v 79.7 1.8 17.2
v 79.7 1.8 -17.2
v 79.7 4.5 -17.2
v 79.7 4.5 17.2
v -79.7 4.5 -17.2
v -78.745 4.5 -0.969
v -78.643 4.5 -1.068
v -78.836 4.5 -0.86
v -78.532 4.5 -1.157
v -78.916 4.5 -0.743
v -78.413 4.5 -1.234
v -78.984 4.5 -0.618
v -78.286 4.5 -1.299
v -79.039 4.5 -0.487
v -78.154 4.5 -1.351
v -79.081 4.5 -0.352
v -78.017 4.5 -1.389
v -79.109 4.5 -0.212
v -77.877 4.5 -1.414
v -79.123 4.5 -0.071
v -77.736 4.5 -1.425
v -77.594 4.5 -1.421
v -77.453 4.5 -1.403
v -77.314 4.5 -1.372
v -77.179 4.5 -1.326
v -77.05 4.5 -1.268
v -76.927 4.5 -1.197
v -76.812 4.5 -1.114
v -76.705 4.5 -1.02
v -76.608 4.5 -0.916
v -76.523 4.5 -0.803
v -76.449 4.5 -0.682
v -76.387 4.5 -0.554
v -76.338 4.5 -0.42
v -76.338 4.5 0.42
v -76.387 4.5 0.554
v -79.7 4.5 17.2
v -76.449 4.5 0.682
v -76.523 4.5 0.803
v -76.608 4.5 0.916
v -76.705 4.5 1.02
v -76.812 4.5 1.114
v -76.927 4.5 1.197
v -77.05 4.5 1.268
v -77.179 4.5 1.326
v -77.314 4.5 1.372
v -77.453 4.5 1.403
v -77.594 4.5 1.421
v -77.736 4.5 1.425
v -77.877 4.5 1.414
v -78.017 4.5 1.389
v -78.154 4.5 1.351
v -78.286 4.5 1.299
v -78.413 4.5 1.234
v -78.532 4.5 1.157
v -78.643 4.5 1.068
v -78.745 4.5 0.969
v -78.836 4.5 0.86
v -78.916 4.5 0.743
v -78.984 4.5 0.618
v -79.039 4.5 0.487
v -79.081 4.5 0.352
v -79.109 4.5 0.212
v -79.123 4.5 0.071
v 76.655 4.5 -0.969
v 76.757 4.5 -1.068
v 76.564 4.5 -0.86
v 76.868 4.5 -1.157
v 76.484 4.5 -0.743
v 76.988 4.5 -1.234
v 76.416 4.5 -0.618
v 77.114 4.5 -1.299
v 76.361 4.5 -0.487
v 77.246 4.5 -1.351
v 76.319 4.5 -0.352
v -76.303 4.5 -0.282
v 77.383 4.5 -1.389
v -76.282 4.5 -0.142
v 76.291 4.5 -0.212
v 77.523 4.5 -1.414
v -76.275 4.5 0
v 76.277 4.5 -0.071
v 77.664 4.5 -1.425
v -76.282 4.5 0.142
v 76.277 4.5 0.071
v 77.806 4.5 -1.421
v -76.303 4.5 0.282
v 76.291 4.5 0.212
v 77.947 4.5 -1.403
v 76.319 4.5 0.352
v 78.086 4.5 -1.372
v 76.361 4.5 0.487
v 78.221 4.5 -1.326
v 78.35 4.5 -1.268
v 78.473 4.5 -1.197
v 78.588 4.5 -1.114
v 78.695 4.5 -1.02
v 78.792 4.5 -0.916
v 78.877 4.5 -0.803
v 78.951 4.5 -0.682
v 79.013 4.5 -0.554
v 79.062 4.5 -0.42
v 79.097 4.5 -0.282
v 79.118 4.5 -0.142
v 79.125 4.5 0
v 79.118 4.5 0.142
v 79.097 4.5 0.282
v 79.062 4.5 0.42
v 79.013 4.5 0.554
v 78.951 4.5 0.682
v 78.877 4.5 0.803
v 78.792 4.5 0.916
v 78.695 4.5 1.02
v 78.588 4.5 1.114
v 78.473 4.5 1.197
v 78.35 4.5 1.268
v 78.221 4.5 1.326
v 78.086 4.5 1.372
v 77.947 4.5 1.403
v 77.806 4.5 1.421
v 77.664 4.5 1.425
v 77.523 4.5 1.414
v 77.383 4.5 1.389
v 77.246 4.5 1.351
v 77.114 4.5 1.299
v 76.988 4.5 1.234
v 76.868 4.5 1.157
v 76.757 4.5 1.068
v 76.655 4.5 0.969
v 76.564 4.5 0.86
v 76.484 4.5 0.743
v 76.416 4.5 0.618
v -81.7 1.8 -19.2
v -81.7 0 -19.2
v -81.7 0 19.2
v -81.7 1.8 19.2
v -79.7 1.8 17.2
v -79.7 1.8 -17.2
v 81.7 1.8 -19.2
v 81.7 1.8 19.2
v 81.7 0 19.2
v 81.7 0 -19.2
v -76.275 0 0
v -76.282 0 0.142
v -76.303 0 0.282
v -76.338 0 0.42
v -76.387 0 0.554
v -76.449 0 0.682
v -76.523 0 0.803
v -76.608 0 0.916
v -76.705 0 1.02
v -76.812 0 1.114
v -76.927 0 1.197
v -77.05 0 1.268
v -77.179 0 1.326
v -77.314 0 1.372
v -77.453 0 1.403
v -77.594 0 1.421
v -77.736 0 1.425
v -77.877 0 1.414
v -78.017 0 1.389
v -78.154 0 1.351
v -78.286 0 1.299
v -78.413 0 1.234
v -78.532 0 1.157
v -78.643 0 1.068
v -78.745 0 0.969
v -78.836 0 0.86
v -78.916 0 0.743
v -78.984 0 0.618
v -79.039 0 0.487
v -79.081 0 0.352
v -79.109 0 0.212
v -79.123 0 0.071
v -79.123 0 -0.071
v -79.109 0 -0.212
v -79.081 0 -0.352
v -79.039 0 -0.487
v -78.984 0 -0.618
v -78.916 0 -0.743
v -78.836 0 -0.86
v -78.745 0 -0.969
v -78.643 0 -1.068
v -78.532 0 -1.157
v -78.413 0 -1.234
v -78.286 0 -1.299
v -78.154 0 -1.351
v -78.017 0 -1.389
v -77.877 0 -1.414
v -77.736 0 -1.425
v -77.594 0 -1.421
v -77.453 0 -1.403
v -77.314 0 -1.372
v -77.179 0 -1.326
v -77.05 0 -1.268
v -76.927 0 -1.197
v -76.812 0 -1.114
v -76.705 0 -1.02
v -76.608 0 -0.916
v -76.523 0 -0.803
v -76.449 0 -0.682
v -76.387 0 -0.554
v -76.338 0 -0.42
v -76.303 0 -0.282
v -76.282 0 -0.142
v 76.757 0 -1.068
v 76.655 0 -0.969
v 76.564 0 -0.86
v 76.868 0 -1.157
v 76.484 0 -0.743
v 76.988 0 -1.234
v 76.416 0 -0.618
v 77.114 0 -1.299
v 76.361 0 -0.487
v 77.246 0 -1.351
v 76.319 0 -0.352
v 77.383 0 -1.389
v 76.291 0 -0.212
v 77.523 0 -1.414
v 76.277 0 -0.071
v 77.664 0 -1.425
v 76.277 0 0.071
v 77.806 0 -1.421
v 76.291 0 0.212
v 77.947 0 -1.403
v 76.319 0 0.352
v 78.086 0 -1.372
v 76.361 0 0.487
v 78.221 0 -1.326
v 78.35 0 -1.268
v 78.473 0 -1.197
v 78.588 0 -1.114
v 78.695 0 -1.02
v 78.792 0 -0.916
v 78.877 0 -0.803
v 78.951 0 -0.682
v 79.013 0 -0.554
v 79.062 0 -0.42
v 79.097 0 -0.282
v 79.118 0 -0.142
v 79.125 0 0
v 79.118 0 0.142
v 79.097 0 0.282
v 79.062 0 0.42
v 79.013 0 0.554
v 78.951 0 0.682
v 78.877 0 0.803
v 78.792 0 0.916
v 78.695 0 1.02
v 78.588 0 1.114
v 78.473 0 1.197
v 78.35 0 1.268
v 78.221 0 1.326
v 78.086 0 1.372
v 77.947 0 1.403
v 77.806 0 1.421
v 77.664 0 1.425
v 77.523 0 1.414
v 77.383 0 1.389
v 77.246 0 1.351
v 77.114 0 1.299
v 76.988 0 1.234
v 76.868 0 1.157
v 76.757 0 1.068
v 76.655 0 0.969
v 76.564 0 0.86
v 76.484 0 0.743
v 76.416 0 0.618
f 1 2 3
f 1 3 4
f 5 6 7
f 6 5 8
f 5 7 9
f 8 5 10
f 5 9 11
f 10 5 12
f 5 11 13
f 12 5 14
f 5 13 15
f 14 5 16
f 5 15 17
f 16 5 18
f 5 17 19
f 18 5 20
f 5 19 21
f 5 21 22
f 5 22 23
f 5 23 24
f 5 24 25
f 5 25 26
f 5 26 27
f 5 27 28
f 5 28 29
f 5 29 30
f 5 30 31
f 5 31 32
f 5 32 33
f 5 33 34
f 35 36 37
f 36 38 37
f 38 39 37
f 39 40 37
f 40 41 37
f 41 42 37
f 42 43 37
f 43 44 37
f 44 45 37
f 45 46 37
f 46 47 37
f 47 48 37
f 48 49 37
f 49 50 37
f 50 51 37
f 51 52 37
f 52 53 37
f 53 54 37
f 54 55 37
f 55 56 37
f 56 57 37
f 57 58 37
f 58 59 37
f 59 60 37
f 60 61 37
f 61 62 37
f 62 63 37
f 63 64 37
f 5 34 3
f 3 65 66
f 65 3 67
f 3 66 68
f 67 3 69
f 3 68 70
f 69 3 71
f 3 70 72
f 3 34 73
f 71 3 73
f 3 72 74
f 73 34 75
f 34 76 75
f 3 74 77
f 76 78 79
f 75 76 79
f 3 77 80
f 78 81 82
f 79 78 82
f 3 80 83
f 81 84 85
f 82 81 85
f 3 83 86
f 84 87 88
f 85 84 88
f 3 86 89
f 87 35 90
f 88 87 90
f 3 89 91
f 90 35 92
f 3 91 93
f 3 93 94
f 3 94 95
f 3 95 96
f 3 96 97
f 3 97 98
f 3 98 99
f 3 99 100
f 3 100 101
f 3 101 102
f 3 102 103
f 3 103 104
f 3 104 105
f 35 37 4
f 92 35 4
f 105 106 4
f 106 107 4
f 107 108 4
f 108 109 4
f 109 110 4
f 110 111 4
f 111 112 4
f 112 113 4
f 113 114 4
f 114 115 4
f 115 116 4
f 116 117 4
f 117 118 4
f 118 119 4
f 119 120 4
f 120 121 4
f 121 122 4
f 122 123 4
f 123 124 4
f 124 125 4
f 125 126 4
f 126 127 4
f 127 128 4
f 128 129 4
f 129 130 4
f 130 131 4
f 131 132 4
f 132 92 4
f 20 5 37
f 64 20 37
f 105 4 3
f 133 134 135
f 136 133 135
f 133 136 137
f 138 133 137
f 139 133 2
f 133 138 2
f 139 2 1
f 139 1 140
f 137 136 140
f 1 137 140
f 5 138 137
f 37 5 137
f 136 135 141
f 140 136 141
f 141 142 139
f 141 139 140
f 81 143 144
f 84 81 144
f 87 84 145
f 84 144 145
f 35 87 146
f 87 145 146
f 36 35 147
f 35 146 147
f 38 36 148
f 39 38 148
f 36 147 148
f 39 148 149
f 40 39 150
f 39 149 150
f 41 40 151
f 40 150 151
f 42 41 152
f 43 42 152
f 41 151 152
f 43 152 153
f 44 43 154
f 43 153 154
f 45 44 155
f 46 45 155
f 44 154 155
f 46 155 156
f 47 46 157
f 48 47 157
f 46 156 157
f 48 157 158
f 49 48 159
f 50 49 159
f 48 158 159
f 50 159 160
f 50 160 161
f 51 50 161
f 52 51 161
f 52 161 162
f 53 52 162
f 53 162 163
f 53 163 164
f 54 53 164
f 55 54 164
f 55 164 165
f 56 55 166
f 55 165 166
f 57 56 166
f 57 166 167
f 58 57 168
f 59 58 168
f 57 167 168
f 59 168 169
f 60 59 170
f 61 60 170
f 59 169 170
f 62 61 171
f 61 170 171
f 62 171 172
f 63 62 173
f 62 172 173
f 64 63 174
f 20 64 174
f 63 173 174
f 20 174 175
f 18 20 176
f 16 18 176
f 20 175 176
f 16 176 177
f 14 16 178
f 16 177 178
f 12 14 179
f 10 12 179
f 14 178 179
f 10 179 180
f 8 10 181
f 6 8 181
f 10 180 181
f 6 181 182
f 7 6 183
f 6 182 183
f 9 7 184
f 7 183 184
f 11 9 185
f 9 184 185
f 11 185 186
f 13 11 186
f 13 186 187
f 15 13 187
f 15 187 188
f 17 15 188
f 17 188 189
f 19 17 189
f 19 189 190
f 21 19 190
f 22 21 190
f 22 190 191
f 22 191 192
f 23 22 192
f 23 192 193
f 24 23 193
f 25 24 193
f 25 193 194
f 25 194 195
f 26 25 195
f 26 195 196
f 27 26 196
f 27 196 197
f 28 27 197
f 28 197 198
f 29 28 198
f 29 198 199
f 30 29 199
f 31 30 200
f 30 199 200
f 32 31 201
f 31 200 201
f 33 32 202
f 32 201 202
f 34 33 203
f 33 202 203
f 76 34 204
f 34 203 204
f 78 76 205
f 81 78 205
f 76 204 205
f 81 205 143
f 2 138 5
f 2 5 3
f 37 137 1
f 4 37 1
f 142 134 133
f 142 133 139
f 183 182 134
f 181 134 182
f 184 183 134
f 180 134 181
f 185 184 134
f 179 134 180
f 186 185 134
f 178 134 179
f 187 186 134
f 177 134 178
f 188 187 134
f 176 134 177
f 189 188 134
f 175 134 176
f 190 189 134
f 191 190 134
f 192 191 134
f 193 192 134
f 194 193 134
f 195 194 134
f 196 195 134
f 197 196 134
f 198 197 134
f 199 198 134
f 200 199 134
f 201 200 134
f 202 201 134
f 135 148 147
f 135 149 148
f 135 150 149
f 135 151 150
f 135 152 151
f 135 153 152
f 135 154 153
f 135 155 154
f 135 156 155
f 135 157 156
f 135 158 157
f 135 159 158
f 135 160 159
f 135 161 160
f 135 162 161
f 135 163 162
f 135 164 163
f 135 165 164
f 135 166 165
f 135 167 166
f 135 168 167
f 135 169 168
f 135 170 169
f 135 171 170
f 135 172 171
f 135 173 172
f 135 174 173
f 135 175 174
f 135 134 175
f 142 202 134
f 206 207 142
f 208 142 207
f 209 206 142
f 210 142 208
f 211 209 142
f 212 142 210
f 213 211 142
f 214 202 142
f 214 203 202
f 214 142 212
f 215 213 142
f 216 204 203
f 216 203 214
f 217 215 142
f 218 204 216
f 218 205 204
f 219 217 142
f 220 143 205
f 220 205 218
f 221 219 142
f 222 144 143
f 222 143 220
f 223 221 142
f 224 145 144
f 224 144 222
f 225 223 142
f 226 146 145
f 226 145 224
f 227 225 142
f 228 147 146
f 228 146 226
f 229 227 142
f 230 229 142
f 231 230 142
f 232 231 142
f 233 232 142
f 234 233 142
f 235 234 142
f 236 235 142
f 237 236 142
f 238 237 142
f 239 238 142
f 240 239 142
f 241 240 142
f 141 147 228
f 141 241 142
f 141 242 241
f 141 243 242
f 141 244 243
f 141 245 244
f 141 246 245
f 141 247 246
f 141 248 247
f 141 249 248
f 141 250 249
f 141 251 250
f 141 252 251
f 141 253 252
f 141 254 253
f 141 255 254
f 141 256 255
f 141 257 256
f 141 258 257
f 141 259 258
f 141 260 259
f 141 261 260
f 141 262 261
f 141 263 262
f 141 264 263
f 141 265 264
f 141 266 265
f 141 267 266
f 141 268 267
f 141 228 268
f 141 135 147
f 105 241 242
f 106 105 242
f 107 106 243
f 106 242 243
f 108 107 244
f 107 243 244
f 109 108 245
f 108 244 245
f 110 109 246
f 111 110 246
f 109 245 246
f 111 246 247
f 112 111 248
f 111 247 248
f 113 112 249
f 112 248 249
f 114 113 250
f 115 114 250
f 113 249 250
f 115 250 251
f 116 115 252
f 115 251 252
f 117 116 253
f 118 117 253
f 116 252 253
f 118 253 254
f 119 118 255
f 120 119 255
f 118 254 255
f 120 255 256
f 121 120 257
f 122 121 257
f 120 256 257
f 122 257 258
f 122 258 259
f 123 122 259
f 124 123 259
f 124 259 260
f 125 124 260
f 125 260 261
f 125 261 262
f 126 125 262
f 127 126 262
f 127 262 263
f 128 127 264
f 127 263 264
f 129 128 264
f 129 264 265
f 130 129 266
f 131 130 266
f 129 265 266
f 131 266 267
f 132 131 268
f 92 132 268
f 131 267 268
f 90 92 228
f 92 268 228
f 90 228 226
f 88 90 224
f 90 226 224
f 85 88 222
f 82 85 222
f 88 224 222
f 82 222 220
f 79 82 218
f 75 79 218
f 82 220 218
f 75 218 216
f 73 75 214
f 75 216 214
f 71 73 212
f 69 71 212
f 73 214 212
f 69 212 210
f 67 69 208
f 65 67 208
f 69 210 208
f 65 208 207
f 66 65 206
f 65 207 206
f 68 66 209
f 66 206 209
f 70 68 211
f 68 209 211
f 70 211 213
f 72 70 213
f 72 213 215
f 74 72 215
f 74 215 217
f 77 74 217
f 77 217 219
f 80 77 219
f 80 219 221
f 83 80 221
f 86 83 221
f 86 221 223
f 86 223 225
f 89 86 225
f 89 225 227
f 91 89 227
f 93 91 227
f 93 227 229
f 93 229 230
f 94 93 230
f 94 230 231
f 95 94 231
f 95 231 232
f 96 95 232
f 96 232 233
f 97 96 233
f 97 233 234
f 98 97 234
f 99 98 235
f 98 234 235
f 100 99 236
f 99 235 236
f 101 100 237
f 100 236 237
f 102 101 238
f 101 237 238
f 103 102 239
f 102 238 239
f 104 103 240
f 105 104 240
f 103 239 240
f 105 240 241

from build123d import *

# Parameters (mm, degrees)
F0_W     = 159.4
F0_H     = 34.4
F0_R     = 1.425
F1_DEPTH = 4.5
F0_W_2   = 163.4
F0_H_2   = 38.4
F2_DEPTH = 1.8


with BuildPart() as f1:
    # F0 (on Front) → F1 (new body)
    with BuildSketch(Plane.XZ):
        Rectangle(F0_W, F0_H)
        with Locations((-77.7, 0)):
            Circle(F0_R, mode=Mode.SUBTRACT)
        with Locations((77.7, 0)):
            Circle(F0_R, mode=Mode.SUBTRACT)
    extrude(amount=-F1_DEPTH)

    # F0 (on Front) → F2 (join)
    with BuildSketch(Plane.XZ):
        Rectangle(F0_W_2, F0_H_2)
        Rectangle(F0_W, F0_H, mode=Mode.SUBTRACT)
    extrude(amount=-F2_DEPTH)


solid = f1.part
